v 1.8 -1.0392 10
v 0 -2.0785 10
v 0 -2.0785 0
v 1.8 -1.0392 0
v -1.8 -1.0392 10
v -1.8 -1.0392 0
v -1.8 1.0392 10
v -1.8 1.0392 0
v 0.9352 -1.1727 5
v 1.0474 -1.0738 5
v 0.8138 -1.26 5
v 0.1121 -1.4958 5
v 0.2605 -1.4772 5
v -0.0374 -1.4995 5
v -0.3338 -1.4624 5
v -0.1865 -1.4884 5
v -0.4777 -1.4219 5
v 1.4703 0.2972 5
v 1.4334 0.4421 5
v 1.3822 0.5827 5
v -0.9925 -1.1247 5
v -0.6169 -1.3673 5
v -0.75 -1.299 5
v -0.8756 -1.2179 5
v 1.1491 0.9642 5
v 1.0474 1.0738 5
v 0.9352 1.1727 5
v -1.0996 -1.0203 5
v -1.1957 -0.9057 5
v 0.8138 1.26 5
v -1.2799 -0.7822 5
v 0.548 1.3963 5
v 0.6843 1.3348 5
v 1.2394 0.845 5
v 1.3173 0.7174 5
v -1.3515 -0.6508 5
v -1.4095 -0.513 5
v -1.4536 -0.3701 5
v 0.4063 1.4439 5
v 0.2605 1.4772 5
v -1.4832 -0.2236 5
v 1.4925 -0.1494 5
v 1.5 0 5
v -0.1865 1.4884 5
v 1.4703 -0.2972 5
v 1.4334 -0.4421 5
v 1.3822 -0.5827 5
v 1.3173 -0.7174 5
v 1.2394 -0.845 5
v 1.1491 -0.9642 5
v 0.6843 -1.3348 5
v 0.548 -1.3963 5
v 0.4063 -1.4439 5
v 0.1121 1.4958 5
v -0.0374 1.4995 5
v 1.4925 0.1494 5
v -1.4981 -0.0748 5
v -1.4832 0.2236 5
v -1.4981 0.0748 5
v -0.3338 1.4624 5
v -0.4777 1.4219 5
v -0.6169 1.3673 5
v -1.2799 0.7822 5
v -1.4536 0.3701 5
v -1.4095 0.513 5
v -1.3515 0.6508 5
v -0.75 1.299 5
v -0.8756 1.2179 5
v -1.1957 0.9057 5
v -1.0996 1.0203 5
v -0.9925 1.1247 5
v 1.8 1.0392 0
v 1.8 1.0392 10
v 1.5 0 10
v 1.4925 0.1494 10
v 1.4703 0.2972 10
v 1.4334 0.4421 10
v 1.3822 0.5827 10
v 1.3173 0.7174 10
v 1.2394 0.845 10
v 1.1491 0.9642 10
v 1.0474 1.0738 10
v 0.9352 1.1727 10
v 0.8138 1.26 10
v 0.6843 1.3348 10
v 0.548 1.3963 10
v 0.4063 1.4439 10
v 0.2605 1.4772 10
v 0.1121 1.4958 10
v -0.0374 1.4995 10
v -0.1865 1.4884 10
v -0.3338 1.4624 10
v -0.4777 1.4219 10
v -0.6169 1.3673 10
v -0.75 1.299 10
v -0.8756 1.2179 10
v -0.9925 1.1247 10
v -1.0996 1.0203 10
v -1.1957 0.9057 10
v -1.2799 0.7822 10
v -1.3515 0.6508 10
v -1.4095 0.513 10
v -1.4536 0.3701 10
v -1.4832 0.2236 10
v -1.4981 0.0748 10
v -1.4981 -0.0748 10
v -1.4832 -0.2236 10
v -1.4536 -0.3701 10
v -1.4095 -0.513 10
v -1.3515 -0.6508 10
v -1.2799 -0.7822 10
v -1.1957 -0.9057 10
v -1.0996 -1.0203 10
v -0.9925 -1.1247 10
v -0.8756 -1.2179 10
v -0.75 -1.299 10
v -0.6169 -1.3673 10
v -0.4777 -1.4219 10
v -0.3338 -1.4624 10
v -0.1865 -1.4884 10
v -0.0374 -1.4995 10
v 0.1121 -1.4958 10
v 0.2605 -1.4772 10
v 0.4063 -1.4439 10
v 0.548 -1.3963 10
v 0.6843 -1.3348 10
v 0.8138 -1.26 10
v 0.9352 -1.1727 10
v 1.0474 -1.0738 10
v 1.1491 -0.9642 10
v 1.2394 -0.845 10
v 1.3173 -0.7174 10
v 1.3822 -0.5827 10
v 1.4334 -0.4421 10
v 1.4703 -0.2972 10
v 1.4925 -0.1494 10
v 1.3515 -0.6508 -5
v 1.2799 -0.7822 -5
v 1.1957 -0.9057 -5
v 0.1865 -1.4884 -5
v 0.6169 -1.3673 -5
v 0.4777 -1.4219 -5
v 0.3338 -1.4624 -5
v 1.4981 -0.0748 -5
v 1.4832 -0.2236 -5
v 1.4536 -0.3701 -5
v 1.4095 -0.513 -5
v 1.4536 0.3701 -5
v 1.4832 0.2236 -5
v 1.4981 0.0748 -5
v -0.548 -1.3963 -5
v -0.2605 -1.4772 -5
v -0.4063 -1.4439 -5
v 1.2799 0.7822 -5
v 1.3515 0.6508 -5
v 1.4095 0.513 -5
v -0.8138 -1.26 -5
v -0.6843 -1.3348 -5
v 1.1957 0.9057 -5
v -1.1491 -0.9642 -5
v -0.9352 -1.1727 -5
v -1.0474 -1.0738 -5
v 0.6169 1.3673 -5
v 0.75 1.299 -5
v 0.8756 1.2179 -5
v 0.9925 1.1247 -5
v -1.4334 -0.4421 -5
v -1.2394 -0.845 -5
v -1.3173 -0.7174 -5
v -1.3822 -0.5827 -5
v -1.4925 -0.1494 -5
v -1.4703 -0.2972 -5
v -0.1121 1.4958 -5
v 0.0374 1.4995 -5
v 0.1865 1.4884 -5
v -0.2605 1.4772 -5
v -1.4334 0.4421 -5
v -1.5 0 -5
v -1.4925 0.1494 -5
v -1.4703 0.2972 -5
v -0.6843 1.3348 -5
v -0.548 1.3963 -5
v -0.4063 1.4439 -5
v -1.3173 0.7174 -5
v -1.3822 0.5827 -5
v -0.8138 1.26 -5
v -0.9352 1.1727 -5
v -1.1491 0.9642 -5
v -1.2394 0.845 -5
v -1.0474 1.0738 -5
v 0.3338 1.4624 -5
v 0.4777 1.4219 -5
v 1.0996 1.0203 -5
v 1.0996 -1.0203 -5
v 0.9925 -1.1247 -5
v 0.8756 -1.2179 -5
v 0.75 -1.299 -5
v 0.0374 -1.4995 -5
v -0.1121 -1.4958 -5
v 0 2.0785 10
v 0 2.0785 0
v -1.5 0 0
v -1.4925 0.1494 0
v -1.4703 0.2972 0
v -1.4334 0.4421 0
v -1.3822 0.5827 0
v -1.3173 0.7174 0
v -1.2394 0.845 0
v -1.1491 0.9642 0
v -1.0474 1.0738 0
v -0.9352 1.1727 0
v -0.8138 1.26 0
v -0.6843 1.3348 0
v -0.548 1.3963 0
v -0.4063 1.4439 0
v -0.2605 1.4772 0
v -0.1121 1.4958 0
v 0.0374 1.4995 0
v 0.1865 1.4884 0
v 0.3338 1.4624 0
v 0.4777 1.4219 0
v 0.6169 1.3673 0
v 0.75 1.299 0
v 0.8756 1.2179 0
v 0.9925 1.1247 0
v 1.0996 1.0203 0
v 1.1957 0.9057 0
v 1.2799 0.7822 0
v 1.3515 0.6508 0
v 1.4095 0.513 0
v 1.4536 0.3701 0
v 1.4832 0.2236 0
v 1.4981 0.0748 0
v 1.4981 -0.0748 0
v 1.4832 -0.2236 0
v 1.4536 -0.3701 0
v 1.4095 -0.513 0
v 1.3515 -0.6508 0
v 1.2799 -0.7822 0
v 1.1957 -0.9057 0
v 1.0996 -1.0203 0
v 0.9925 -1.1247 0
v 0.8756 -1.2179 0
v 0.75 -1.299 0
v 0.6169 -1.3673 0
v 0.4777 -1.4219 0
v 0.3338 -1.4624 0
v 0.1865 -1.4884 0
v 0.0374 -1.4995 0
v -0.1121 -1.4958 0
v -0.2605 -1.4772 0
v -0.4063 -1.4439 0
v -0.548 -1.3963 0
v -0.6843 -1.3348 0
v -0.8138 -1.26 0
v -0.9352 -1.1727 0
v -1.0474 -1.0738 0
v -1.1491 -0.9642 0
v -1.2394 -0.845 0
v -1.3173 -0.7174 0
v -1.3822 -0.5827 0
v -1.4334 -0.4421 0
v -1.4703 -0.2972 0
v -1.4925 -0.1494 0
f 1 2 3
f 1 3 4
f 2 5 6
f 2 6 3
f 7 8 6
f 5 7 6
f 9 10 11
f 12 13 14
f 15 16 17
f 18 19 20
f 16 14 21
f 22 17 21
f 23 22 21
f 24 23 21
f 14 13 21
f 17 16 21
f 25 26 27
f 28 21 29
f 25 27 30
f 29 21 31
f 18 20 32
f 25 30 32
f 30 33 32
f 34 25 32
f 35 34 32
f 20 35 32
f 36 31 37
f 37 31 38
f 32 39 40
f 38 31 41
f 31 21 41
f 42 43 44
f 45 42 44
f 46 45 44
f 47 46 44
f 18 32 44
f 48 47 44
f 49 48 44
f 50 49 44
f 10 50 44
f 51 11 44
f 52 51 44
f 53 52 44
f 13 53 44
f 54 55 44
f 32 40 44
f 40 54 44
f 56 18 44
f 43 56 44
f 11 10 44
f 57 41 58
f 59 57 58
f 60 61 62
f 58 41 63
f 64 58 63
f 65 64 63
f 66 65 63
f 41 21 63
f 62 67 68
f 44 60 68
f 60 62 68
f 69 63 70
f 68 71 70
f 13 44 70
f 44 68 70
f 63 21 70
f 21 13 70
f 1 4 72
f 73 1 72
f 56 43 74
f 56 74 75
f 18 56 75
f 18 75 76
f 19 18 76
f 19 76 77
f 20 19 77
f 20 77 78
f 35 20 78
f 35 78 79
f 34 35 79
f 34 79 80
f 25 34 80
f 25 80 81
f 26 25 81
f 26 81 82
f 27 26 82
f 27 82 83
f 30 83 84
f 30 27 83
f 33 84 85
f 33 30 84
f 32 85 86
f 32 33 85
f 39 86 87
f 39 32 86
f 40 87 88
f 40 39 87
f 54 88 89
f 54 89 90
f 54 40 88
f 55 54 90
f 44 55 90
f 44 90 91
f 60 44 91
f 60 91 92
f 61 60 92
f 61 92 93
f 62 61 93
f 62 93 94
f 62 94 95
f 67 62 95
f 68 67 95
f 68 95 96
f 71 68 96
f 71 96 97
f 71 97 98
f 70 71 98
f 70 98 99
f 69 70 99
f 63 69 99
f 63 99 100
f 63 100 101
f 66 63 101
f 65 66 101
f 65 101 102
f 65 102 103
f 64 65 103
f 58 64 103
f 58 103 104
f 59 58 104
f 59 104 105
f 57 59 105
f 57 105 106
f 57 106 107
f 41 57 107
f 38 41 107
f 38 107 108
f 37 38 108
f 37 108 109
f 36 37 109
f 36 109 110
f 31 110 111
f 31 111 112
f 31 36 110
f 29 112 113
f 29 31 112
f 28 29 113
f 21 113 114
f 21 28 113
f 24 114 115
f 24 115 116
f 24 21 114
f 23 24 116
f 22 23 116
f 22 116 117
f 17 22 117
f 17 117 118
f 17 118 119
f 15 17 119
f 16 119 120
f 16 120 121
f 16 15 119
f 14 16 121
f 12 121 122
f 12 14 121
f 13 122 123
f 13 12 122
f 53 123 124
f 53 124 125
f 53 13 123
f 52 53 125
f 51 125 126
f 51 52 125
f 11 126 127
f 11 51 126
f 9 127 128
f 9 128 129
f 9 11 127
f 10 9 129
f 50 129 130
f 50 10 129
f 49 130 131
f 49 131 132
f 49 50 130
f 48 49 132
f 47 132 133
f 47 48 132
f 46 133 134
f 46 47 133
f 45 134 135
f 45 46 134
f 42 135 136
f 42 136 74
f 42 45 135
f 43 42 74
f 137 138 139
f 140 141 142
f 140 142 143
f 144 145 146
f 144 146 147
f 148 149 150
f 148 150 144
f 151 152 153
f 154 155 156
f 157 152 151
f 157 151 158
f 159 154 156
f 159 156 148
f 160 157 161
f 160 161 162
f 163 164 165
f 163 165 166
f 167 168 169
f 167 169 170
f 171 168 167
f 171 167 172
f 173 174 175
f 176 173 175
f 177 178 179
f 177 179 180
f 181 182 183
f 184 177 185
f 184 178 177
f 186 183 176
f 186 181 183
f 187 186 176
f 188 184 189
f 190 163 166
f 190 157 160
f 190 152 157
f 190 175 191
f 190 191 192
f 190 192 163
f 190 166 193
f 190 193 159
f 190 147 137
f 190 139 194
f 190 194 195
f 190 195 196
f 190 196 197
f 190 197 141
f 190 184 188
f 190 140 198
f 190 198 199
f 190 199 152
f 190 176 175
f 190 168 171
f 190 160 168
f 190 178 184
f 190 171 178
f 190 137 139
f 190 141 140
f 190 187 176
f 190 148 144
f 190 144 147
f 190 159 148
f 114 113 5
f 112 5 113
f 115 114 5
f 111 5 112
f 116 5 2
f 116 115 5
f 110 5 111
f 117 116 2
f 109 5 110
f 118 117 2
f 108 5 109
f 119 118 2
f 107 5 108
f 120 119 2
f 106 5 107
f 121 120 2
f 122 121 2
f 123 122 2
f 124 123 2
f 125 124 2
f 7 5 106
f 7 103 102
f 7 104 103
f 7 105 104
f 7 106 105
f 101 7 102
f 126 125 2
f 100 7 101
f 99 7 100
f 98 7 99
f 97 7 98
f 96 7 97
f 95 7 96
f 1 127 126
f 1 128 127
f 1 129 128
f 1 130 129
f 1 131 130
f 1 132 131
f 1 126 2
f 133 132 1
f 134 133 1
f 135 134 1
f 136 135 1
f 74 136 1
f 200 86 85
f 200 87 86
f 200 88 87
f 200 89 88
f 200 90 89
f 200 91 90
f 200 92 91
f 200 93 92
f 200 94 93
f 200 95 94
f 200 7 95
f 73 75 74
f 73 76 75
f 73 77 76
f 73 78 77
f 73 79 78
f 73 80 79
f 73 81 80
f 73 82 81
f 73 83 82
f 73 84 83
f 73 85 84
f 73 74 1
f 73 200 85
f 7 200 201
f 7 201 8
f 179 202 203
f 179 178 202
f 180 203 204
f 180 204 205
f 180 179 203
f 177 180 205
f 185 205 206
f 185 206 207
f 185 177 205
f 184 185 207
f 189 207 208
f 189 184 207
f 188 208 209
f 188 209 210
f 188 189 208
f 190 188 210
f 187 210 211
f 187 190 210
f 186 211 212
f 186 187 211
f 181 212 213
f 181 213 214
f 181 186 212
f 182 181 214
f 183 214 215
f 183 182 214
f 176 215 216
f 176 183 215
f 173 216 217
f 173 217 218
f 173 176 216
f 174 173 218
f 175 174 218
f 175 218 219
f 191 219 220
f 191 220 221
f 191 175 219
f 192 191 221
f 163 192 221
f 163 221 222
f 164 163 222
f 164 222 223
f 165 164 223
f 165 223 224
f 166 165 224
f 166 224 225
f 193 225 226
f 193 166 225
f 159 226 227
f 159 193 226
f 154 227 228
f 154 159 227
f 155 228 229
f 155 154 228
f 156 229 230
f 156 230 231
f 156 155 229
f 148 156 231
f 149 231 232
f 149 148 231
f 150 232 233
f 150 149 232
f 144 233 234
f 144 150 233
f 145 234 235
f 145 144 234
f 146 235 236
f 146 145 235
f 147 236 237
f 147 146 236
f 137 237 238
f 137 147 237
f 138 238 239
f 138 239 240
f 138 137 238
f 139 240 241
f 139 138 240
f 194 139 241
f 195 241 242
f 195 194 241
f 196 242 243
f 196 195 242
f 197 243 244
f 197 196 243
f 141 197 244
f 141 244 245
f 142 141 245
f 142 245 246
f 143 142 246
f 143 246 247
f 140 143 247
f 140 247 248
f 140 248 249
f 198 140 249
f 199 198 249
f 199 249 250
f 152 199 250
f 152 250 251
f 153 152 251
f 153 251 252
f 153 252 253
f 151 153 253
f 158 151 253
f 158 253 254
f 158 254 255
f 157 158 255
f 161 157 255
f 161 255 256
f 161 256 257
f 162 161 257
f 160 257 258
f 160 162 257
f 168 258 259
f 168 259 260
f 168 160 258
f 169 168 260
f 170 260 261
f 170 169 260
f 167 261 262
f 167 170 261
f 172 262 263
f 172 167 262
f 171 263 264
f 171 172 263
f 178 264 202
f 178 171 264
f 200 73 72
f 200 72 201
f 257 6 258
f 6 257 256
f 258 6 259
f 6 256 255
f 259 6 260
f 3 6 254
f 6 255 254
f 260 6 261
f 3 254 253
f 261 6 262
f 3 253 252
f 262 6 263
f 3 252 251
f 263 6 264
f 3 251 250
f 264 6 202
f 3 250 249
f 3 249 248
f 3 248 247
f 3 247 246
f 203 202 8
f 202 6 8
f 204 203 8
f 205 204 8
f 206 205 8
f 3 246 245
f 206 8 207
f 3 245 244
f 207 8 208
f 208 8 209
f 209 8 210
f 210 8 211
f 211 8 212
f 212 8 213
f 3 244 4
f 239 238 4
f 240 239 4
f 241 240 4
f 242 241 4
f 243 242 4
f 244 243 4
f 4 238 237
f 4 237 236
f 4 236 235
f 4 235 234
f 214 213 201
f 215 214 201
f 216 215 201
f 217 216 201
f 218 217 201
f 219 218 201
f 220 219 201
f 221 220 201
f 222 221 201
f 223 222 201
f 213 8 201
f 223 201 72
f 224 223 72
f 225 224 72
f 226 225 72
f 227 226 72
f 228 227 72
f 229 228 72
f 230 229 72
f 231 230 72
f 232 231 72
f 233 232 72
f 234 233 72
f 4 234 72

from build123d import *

# Parameters (mm, degrees)
SKETCH_1_R      = 1.5
EXTRUDE_1_DEPTH = 10
SKETCH_2_R      = 1.5
EXTRUDE_2_DEPTH = 5


with BuildPart() as part:
    # 草图1 → 凸台-拉伸1 (new body)
    with BuildSketch(Plane.XY):
        Polygon((0, 2.078460969), (-1.8, 1.039230485), (-1.8, -1.039230485), (0, -2.078460969), (1.8, -1.039230485), (1.8, 1.039230485), align=None)
        Circle(SKETCH_1_R, mode=Mode.SUBTRACT)
    extrude(amount=EXTRUDE_1_DEPTH)

    # 草图2 → 凸台-拉伸2 (add, symmetric)
    with BuildSketch(Plane(origin=(0, 0, 0), x_dir=(-1, 0, 0), z_dir=(0, 0, -1))):
        Circle(SKETCH_2_R)
    extrude(amount=EXTRUDE_2_DEPTH, both=True)


solid = part.part
